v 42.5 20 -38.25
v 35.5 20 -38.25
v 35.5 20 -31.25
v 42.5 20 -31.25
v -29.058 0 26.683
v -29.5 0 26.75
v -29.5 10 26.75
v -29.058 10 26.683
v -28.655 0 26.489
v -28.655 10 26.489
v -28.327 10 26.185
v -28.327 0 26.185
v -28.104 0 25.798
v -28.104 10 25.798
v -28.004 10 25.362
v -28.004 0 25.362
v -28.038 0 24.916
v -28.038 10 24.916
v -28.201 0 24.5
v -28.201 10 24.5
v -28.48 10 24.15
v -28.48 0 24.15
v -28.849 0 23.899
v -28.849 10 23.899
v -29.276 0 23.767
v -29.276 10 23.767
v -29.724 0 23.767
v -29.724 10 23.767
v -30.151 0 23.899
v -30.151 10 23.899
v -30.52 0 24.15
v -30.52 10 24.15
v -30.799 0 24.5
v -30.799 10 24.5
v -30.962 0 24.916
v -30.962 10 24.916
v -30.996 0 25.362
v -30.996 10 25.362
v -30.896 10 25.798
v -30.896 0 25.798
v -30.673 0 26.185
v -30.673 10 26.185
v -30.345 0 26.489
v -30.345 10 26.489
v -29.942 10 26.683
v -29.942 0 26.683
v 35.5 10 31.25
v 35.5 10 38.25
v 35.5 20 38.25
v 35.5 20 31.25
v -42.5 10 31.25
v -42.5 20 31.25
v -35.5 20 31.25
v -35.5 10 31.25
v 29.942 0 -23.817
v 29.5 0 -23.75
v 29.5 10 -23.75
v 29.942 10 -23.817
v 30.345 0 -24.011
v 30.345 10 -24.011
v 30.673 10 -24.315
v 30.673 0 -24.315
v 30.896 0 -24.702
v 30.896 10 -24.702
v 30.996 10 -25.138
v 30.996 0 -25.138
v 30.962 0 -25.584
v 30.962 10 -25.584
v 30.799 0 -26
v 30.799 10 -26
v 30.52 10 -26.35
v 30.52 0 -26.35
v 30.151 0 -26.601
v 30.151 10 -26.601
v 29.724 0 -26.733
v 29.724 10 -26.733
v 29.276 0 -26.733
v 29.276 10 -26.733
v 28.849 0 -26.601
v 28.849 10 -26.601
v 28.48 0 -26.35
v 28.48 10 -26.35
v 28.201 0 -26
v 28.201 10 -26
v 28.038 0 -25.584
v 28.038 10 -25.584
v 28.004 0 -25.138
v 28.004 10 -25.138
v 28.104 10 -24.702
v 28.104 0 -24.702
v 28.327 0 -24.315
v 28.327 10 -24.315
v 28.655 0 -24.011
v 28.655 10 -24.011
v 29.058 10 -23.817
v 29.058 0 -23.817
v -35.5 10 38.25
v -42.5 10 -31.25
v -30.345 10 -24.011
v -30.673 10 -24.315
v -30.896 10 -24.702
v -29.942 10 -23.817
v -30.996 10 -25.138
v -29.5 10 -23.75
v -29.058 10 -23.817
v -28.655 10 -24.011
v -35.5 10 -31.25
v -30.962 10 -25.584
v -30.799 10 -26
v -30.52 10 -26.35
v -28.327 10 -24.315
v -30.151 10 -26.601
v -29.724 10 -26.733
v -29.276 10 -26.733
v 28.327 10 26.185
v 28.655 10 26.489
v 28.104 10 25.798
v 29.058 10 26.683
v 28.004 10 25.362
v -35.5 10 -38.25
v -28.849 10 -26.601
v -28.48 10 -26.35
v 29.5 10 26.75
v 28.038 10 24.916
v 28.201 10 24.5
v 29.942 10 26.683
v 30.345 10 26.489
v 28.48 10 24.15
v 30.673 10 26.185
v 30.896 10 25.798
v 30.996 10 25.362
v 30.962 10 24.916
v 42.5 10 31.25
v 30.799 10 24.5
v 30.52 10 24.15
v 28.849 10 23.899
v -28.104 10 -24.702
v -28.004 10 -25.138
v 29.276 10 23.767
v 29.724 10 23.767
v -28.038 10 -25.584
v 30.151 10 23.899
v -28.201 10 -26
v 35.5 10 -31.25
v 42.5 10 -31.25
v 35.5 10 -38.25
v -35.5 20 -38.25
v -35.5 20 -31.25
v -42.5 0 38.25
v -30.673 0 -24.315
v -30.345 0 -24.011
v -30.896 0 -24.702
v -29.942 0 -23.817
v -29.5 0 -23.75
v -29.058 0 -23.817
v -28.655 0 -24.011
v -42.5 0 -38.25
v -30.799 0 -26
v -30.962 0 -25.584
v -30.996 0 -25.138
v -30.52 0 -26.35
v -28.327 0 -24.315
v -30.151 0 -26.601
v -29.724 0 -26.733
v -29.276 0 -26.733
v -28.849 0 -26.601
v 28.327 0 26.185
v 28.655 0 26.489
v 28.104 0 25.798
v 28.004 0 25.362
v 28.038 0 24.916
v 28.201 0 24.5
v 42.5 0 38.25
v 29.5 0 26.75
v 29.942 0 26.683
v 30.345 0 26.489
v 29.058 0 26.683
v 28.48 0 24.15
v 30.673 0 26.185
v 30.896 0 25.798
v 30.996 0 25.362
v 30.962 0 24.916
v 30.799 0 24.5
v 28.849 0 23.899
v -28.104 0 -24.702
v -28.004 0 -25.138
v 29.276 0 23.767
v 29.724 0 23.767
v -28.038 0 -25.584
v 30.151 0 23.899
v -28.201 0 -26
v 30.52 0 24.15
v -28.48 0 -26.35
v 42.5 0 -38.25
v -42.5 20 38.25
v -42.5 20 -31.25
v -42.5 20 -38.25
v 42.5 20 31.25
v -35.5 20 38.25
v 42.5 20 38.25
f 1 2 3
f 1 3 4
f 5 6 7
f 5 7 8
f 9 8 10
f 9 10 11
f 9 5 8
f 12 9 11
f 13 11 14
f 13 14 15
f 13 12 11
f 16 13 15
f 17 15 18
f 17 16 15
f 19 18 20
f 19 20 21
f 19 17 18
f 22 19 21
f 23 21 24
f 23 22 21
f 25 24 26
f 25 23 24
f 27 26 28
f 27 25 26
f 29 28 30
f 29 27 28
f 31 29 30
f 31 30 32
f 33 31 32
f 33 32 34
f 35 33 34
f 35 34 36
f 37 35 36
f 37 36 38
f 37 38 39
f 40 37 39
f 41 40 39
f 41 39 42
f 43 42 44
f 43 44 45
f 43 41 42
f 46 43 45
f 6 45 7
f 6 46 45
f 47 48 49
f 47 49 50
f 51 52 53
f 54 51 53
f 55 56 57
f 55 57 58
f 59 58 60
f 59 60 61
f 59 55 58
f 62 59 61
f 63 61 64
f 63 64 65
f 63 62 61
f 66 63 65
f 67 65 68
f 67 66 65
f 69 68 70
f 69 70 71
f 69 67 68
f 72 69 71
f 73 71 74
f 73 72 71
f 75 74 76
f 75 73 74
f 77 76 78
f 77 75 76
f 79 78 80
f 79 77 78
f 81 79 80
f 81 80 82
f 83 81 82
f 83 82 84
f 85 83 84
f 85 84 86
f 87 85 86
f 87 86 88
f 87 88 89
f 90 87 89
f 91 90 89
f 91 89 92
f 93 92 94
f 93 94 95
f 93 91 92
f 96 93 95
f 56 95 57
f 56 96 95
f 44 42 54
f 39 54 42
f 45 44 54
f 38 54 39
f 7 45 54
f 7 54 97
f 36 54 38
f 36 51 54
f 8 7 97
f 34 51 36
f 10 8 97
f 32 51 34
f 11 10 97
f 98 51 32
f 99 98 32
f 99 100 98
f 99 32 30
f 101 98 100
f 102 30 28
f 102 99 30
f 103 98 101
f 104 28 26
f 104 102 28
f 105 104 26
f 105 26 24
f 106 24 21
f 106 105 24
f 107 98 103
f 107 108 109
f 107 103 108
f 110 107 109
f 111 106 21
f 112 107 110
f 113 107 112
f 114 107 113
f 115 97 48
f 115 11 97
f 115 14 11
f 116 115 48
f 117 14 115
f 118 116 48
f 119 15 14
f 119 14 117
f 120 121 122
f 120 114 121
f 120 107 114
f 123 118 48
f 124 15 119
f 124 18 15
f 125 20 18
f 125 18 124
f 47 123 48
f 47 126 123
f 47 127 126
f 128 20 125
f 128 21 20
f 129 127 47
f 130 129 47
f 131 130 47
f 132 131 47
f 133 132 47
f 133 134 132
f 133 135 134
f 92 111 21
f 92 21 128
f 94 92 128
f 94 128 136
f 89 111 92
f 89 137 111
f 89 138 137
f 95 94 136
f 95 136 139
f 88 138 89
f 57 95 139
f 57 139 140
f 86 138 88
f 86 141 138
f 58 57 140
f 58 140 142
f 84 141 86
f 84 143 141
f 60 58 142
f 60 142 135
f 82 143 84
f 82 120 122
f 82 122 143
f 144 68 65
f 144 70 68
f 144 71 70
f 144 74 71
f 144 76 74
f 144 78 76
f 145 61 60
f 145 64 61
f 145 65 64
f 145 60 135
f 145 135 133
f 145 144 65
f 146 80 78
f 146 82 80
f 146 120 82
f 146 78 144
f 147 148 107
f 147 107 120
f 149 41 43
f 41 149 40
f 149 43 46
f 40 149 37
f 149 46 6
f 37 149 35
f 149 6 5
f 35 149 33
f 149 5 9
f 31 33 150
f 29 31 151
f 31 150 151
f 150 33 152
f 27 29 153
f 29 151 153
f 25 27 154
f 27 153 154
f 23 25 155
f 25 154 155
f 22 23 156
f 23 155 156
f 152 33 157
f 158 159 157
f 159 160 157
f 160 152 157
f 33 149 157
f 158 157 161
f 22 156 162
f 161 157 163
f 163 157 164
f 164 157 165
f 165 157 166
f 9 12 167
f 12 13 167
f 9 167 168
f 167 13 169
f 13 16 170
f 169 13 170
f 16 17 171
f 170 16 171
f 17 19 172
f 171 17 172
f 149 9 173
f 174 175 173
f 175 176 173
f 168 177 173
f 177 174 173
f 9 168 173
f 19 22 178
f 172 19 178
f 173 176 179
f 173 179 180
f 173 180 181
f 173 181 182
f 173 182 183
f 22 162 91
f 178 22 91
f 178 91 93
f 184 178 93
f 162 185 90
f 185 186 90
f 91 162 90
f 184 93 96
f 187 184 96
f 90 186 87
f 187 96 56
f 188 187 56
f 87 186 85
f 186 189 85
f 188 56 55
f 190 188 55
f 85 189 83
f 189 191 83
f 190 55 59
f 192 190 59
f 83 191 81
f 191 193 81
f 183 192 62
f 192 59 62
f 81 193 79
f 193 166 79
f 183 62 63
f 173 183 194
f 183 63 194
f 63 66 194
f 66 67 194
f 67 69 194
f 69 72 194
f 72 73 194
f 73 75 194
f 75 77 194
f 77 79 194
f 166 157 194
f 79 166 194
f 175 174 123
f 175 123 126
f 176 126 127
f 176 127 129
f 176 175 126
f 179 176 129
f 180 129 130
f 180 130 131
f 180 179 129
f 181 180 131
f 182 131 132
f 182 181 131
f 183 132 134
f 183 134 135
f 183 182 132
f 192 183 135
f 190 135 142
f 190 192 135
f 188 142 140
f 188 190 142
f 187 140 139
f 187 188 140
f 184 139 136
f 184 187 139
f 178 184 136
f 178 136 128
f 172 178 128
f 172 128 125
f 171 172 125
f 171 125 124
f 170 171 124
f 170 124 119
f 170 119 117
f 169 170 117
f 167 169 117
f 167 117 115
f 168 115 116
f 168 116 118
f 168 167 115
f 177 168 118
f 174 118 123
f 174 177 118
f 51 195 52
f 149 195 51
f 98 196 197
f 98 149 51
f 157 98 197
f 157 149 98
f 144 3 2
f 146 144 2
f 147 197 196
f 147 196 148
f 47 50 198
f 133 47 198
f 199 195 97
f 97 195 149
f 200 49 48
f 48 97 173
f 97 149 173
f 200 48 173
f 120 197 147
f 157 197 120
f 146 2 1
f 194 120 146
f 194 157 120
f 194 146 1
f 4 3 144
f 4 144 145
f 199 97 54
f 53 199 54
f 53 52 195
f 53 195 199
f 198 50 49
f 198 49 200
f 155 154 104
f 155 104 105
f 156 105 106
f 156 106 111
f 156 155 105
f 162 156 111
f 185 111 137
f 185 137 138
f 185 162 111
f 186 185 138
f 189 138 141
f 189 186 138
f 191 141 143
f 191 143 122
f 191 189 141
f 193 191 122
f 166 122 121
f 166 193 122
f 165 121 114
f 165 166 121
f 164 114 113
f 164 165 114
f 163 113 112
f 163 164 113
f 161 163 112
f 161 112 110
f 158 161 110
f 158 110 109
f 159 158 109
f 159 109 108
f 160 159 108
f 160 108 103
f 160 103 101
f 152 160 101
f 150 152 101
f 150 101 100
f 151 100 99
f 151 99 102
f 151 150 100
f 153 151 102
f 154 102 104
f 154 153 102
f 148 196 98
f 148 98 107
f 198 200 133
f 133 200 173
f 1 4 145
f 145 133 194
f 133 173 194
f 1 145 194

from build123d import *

# Parameters (mm, degrees)
SKETCH1_W           = 85
SKETCH1_H           = 76.5
SKETCH1_R           = 1.5
BOSS_EXTRUDE1_DEPTH = 10
SKETCH2_W           = 7
SKETCH2_H           = 7
BOSS_EXTRUDE2_DEPTH = 10


with BuildPart() as part:
    # Sketch1 → Boss-Extrude1 (new body)
    with BuildSketch(Plane(origin=(0, 0, 0), x_dir=(1, 0, 0), z_dir=(0, 1, 0))):
        Rectangle(SKETCH1_W, SKETCH1_H)
        with Locations(Location((-29.5, 25.25, 0), (0, 0, 270))):
            Circle(SKETCH1_R, mode=Mode.SUBTRACT)
        with Locations(Location((-29.5, -25.25, 0), (0, 0, 270))):
            Circle(SKETCH1_R, mode=Mode.SUBTRACT)
        with Locations(Location((29.5, -25.25, 0), (0, 0, 270))):
            Circle(SKETCH1_R, mode=Mode.SUBTRACT)
        with Locations(Location((29.5, 25.25, 0), (0, 0, 270))):
            Circle(SKETCH1_R, mode=Mode.SUBTRACT)
    extrude(amount=BOSS_EXTRUDE1_DEPTH)

    # Sketch2 → Boss-Extrude2 (add)
    with BuildSketch(Plane(origin=(0, 10, 0), x_dir=(1, 0, 0), z_dir=(0, 1, 0))):
        with Locations((-39, 34.75)):
            Rectangle(SKETCH2_W, SKETCH2_H)
        with Locations((39, 34.75)):
            Rectangle(SKETCH2_W, SKETCH2_H)
        with Locations((-39, -34.75)):
            Rectangle(SKETCH2_W, SKETCH2_H)
        with Locations((39, -34.75)):
            Rectangle(SKETCH2_W, SKETCH2_H)
    extrude(amount=BOSS_EXTRUDE2_DEPTH)


solid = part.part
